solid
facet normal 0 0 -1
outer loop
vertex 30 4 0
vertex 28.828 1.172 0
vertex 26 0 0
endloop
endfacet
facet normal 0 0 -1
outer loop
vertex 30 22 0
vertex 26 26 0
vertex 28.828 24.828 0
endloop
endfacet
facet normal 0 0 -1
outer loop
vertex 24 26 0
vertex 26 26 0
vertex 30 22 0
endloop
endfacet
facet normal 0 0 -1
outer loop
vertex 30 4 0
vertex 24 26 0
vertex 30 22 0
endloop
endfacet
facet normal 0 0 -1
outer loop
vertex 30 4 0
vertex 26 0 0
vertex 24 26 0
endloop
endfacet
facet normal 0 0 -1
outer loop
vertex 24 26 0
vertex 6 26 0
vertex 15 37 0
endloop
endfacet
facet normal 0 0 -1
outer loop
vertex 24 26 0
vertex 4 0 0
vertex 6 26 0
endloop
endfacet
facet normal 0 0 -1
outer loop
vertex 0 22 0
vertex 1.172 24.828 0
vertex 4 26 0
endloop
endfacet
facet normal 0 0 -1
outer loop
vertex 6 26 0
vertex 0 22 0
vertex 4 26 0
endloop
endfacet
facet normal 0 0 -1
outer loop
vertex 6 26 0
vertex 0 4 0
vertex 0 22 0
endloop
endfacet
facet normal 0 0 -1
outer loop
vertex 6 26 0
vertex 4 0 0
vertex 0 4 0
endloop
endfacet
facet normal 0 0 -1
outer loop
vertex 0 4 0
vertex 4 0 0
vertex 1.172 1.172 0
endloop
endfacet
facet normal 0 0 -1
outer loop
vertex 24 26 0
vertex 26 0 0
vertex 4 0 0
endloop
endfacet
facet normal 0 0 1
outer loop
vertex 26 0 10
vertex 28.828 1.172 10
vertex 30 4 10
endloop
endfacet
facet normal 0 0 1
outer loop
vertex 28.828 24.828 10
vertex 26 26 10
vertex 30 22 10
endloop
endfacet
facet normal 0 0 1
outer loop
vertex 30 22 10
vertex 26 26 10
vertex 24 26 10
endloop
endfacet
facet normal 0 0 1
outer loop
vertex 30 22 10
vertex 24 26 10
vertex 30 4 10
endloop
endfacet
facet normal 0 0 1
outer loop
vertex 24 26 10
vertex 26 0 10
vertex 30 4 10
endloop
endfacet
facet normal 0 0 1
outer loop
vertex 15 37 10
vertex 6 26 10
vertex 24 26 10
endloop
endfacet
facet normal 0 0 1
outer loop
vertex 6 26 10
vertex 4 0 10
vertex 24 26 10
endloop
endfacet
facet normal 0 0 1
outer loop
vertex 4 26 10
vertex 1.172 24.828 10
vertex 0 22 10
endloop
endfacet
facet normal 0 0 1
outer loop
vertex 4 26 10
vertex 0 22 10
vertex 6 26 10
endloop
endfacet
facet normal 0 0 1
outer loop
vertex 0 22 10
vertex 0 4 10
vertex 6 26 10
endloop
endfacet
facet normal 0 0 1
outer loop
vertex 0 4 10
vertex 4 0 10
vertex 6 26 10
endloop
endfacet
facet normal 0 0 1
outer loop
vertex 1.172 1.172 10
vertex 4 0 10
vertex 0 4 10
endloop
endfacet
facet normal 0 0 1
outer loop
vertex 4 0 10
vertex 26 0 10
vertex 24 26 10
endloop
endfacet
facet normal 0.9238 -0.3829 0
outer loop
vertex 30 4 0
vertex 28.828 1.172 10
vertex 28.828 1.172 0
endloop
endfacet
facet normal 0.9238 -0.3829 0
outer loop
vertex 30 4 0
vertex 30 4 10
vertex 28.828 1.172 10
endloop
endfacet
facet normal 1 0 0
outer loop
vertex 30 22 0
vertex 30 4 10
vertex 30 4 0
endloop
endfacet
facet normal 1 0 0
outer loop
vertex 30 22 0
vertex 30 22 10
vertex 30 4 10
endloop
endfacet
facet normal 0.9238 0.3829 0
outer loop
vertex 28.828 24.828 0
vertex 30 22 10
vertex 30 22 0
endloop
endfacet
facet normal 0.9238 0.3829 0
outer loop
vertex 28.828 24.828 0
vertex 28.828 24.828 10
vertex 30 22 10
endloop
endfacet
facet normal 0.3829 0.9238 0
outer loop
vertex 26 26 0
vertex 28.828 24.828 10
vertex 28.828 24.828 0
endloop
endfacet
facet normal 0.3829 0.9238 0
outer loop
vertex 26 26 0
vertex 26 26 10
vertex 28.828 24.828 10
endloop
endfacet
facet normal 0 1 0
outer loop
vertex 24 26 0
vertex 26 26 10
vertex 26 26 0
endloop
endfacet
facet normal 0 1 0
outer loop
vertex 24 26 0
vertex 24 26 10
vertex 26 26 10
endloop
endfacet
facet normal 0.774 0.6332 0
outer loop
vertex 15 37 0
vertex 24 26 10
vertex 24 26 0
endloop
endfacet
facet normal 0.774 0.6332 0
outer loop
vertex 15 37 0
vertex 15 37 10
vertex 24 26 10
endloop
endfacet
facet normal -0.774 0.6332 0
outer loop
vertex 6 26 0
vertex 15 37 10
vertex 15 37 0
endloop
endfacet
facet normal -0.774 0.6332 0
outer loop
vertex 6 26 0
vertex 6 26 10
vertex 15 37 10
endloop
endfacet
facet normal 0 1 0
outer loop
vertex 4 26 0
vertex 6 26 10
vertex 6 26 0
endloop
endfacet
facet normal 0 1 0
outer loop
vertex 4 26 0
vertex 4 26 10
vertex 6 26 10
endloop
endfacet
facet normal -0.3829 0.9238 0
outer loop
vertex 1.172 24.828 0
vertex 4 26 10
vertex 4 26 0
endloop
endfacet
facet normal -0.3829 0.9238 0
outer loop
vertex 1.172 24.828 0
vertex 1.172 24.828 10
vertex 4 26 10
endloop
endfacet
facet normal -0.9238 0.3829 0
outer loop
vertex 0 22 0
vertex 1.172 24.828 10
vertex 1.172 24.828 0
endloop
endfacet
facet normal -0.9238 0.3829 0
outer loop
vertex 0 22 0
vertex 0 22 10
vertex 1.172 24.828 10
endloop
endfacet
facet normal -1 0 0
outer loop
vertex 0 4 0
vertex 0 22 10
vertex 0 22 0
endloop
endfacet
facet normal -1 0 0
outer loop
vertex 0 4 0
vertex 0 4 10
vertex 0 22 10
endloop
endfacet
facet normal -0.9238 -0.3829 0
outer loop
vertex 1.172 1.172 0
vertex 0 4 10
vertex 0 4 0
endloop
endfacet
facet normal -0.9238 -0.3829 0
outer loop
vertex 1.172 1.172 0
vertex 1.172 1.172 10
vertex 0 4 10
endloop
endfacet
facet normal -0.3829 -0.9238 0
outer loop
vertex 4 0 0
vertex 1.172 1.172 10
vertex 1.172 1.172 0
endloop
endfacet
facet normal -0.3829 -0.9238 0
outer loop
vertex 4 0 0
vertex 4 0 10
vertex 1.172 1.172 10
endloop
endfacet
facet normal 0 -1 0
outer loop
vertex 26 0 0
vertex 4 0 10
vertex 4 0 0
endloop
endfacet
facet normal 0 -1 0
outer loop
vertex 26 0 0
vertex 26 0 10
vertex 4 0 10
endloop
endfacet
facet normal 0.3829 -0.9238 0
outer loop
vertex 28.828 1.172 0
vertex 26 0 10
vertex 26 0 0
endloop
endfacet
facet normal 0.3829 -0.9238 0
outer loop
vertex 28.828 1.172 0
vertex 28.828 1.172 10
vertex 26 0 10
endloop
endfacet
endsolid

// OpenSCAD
$fn = 32;

// ----------------------------------------------------------------------
// Ratchet pawl: 30 x 26 mm body, beak 11 mm сверху
// ----------------------------------------------------------------------

// --- parameters (mm) ---
profile_height = 10;      // extrusion height
profile_points = 15;      // points of the closed outline

profile = [[0, 4], [1.172, 1.172], [4, 0], [26, 0], [28.828, 1.172], [30, 4], [30, 22], [28.828, 24.828], [26, 26], [24, 26], [15, 37], [6, 26], [4, 26], [1.172, 24.828], [0, 22]];  // single closed polygon, 15 points, counter clockwise

// --- the one profile operation ---
linear_extrude(height = profile_height) polygon(points = profile);
